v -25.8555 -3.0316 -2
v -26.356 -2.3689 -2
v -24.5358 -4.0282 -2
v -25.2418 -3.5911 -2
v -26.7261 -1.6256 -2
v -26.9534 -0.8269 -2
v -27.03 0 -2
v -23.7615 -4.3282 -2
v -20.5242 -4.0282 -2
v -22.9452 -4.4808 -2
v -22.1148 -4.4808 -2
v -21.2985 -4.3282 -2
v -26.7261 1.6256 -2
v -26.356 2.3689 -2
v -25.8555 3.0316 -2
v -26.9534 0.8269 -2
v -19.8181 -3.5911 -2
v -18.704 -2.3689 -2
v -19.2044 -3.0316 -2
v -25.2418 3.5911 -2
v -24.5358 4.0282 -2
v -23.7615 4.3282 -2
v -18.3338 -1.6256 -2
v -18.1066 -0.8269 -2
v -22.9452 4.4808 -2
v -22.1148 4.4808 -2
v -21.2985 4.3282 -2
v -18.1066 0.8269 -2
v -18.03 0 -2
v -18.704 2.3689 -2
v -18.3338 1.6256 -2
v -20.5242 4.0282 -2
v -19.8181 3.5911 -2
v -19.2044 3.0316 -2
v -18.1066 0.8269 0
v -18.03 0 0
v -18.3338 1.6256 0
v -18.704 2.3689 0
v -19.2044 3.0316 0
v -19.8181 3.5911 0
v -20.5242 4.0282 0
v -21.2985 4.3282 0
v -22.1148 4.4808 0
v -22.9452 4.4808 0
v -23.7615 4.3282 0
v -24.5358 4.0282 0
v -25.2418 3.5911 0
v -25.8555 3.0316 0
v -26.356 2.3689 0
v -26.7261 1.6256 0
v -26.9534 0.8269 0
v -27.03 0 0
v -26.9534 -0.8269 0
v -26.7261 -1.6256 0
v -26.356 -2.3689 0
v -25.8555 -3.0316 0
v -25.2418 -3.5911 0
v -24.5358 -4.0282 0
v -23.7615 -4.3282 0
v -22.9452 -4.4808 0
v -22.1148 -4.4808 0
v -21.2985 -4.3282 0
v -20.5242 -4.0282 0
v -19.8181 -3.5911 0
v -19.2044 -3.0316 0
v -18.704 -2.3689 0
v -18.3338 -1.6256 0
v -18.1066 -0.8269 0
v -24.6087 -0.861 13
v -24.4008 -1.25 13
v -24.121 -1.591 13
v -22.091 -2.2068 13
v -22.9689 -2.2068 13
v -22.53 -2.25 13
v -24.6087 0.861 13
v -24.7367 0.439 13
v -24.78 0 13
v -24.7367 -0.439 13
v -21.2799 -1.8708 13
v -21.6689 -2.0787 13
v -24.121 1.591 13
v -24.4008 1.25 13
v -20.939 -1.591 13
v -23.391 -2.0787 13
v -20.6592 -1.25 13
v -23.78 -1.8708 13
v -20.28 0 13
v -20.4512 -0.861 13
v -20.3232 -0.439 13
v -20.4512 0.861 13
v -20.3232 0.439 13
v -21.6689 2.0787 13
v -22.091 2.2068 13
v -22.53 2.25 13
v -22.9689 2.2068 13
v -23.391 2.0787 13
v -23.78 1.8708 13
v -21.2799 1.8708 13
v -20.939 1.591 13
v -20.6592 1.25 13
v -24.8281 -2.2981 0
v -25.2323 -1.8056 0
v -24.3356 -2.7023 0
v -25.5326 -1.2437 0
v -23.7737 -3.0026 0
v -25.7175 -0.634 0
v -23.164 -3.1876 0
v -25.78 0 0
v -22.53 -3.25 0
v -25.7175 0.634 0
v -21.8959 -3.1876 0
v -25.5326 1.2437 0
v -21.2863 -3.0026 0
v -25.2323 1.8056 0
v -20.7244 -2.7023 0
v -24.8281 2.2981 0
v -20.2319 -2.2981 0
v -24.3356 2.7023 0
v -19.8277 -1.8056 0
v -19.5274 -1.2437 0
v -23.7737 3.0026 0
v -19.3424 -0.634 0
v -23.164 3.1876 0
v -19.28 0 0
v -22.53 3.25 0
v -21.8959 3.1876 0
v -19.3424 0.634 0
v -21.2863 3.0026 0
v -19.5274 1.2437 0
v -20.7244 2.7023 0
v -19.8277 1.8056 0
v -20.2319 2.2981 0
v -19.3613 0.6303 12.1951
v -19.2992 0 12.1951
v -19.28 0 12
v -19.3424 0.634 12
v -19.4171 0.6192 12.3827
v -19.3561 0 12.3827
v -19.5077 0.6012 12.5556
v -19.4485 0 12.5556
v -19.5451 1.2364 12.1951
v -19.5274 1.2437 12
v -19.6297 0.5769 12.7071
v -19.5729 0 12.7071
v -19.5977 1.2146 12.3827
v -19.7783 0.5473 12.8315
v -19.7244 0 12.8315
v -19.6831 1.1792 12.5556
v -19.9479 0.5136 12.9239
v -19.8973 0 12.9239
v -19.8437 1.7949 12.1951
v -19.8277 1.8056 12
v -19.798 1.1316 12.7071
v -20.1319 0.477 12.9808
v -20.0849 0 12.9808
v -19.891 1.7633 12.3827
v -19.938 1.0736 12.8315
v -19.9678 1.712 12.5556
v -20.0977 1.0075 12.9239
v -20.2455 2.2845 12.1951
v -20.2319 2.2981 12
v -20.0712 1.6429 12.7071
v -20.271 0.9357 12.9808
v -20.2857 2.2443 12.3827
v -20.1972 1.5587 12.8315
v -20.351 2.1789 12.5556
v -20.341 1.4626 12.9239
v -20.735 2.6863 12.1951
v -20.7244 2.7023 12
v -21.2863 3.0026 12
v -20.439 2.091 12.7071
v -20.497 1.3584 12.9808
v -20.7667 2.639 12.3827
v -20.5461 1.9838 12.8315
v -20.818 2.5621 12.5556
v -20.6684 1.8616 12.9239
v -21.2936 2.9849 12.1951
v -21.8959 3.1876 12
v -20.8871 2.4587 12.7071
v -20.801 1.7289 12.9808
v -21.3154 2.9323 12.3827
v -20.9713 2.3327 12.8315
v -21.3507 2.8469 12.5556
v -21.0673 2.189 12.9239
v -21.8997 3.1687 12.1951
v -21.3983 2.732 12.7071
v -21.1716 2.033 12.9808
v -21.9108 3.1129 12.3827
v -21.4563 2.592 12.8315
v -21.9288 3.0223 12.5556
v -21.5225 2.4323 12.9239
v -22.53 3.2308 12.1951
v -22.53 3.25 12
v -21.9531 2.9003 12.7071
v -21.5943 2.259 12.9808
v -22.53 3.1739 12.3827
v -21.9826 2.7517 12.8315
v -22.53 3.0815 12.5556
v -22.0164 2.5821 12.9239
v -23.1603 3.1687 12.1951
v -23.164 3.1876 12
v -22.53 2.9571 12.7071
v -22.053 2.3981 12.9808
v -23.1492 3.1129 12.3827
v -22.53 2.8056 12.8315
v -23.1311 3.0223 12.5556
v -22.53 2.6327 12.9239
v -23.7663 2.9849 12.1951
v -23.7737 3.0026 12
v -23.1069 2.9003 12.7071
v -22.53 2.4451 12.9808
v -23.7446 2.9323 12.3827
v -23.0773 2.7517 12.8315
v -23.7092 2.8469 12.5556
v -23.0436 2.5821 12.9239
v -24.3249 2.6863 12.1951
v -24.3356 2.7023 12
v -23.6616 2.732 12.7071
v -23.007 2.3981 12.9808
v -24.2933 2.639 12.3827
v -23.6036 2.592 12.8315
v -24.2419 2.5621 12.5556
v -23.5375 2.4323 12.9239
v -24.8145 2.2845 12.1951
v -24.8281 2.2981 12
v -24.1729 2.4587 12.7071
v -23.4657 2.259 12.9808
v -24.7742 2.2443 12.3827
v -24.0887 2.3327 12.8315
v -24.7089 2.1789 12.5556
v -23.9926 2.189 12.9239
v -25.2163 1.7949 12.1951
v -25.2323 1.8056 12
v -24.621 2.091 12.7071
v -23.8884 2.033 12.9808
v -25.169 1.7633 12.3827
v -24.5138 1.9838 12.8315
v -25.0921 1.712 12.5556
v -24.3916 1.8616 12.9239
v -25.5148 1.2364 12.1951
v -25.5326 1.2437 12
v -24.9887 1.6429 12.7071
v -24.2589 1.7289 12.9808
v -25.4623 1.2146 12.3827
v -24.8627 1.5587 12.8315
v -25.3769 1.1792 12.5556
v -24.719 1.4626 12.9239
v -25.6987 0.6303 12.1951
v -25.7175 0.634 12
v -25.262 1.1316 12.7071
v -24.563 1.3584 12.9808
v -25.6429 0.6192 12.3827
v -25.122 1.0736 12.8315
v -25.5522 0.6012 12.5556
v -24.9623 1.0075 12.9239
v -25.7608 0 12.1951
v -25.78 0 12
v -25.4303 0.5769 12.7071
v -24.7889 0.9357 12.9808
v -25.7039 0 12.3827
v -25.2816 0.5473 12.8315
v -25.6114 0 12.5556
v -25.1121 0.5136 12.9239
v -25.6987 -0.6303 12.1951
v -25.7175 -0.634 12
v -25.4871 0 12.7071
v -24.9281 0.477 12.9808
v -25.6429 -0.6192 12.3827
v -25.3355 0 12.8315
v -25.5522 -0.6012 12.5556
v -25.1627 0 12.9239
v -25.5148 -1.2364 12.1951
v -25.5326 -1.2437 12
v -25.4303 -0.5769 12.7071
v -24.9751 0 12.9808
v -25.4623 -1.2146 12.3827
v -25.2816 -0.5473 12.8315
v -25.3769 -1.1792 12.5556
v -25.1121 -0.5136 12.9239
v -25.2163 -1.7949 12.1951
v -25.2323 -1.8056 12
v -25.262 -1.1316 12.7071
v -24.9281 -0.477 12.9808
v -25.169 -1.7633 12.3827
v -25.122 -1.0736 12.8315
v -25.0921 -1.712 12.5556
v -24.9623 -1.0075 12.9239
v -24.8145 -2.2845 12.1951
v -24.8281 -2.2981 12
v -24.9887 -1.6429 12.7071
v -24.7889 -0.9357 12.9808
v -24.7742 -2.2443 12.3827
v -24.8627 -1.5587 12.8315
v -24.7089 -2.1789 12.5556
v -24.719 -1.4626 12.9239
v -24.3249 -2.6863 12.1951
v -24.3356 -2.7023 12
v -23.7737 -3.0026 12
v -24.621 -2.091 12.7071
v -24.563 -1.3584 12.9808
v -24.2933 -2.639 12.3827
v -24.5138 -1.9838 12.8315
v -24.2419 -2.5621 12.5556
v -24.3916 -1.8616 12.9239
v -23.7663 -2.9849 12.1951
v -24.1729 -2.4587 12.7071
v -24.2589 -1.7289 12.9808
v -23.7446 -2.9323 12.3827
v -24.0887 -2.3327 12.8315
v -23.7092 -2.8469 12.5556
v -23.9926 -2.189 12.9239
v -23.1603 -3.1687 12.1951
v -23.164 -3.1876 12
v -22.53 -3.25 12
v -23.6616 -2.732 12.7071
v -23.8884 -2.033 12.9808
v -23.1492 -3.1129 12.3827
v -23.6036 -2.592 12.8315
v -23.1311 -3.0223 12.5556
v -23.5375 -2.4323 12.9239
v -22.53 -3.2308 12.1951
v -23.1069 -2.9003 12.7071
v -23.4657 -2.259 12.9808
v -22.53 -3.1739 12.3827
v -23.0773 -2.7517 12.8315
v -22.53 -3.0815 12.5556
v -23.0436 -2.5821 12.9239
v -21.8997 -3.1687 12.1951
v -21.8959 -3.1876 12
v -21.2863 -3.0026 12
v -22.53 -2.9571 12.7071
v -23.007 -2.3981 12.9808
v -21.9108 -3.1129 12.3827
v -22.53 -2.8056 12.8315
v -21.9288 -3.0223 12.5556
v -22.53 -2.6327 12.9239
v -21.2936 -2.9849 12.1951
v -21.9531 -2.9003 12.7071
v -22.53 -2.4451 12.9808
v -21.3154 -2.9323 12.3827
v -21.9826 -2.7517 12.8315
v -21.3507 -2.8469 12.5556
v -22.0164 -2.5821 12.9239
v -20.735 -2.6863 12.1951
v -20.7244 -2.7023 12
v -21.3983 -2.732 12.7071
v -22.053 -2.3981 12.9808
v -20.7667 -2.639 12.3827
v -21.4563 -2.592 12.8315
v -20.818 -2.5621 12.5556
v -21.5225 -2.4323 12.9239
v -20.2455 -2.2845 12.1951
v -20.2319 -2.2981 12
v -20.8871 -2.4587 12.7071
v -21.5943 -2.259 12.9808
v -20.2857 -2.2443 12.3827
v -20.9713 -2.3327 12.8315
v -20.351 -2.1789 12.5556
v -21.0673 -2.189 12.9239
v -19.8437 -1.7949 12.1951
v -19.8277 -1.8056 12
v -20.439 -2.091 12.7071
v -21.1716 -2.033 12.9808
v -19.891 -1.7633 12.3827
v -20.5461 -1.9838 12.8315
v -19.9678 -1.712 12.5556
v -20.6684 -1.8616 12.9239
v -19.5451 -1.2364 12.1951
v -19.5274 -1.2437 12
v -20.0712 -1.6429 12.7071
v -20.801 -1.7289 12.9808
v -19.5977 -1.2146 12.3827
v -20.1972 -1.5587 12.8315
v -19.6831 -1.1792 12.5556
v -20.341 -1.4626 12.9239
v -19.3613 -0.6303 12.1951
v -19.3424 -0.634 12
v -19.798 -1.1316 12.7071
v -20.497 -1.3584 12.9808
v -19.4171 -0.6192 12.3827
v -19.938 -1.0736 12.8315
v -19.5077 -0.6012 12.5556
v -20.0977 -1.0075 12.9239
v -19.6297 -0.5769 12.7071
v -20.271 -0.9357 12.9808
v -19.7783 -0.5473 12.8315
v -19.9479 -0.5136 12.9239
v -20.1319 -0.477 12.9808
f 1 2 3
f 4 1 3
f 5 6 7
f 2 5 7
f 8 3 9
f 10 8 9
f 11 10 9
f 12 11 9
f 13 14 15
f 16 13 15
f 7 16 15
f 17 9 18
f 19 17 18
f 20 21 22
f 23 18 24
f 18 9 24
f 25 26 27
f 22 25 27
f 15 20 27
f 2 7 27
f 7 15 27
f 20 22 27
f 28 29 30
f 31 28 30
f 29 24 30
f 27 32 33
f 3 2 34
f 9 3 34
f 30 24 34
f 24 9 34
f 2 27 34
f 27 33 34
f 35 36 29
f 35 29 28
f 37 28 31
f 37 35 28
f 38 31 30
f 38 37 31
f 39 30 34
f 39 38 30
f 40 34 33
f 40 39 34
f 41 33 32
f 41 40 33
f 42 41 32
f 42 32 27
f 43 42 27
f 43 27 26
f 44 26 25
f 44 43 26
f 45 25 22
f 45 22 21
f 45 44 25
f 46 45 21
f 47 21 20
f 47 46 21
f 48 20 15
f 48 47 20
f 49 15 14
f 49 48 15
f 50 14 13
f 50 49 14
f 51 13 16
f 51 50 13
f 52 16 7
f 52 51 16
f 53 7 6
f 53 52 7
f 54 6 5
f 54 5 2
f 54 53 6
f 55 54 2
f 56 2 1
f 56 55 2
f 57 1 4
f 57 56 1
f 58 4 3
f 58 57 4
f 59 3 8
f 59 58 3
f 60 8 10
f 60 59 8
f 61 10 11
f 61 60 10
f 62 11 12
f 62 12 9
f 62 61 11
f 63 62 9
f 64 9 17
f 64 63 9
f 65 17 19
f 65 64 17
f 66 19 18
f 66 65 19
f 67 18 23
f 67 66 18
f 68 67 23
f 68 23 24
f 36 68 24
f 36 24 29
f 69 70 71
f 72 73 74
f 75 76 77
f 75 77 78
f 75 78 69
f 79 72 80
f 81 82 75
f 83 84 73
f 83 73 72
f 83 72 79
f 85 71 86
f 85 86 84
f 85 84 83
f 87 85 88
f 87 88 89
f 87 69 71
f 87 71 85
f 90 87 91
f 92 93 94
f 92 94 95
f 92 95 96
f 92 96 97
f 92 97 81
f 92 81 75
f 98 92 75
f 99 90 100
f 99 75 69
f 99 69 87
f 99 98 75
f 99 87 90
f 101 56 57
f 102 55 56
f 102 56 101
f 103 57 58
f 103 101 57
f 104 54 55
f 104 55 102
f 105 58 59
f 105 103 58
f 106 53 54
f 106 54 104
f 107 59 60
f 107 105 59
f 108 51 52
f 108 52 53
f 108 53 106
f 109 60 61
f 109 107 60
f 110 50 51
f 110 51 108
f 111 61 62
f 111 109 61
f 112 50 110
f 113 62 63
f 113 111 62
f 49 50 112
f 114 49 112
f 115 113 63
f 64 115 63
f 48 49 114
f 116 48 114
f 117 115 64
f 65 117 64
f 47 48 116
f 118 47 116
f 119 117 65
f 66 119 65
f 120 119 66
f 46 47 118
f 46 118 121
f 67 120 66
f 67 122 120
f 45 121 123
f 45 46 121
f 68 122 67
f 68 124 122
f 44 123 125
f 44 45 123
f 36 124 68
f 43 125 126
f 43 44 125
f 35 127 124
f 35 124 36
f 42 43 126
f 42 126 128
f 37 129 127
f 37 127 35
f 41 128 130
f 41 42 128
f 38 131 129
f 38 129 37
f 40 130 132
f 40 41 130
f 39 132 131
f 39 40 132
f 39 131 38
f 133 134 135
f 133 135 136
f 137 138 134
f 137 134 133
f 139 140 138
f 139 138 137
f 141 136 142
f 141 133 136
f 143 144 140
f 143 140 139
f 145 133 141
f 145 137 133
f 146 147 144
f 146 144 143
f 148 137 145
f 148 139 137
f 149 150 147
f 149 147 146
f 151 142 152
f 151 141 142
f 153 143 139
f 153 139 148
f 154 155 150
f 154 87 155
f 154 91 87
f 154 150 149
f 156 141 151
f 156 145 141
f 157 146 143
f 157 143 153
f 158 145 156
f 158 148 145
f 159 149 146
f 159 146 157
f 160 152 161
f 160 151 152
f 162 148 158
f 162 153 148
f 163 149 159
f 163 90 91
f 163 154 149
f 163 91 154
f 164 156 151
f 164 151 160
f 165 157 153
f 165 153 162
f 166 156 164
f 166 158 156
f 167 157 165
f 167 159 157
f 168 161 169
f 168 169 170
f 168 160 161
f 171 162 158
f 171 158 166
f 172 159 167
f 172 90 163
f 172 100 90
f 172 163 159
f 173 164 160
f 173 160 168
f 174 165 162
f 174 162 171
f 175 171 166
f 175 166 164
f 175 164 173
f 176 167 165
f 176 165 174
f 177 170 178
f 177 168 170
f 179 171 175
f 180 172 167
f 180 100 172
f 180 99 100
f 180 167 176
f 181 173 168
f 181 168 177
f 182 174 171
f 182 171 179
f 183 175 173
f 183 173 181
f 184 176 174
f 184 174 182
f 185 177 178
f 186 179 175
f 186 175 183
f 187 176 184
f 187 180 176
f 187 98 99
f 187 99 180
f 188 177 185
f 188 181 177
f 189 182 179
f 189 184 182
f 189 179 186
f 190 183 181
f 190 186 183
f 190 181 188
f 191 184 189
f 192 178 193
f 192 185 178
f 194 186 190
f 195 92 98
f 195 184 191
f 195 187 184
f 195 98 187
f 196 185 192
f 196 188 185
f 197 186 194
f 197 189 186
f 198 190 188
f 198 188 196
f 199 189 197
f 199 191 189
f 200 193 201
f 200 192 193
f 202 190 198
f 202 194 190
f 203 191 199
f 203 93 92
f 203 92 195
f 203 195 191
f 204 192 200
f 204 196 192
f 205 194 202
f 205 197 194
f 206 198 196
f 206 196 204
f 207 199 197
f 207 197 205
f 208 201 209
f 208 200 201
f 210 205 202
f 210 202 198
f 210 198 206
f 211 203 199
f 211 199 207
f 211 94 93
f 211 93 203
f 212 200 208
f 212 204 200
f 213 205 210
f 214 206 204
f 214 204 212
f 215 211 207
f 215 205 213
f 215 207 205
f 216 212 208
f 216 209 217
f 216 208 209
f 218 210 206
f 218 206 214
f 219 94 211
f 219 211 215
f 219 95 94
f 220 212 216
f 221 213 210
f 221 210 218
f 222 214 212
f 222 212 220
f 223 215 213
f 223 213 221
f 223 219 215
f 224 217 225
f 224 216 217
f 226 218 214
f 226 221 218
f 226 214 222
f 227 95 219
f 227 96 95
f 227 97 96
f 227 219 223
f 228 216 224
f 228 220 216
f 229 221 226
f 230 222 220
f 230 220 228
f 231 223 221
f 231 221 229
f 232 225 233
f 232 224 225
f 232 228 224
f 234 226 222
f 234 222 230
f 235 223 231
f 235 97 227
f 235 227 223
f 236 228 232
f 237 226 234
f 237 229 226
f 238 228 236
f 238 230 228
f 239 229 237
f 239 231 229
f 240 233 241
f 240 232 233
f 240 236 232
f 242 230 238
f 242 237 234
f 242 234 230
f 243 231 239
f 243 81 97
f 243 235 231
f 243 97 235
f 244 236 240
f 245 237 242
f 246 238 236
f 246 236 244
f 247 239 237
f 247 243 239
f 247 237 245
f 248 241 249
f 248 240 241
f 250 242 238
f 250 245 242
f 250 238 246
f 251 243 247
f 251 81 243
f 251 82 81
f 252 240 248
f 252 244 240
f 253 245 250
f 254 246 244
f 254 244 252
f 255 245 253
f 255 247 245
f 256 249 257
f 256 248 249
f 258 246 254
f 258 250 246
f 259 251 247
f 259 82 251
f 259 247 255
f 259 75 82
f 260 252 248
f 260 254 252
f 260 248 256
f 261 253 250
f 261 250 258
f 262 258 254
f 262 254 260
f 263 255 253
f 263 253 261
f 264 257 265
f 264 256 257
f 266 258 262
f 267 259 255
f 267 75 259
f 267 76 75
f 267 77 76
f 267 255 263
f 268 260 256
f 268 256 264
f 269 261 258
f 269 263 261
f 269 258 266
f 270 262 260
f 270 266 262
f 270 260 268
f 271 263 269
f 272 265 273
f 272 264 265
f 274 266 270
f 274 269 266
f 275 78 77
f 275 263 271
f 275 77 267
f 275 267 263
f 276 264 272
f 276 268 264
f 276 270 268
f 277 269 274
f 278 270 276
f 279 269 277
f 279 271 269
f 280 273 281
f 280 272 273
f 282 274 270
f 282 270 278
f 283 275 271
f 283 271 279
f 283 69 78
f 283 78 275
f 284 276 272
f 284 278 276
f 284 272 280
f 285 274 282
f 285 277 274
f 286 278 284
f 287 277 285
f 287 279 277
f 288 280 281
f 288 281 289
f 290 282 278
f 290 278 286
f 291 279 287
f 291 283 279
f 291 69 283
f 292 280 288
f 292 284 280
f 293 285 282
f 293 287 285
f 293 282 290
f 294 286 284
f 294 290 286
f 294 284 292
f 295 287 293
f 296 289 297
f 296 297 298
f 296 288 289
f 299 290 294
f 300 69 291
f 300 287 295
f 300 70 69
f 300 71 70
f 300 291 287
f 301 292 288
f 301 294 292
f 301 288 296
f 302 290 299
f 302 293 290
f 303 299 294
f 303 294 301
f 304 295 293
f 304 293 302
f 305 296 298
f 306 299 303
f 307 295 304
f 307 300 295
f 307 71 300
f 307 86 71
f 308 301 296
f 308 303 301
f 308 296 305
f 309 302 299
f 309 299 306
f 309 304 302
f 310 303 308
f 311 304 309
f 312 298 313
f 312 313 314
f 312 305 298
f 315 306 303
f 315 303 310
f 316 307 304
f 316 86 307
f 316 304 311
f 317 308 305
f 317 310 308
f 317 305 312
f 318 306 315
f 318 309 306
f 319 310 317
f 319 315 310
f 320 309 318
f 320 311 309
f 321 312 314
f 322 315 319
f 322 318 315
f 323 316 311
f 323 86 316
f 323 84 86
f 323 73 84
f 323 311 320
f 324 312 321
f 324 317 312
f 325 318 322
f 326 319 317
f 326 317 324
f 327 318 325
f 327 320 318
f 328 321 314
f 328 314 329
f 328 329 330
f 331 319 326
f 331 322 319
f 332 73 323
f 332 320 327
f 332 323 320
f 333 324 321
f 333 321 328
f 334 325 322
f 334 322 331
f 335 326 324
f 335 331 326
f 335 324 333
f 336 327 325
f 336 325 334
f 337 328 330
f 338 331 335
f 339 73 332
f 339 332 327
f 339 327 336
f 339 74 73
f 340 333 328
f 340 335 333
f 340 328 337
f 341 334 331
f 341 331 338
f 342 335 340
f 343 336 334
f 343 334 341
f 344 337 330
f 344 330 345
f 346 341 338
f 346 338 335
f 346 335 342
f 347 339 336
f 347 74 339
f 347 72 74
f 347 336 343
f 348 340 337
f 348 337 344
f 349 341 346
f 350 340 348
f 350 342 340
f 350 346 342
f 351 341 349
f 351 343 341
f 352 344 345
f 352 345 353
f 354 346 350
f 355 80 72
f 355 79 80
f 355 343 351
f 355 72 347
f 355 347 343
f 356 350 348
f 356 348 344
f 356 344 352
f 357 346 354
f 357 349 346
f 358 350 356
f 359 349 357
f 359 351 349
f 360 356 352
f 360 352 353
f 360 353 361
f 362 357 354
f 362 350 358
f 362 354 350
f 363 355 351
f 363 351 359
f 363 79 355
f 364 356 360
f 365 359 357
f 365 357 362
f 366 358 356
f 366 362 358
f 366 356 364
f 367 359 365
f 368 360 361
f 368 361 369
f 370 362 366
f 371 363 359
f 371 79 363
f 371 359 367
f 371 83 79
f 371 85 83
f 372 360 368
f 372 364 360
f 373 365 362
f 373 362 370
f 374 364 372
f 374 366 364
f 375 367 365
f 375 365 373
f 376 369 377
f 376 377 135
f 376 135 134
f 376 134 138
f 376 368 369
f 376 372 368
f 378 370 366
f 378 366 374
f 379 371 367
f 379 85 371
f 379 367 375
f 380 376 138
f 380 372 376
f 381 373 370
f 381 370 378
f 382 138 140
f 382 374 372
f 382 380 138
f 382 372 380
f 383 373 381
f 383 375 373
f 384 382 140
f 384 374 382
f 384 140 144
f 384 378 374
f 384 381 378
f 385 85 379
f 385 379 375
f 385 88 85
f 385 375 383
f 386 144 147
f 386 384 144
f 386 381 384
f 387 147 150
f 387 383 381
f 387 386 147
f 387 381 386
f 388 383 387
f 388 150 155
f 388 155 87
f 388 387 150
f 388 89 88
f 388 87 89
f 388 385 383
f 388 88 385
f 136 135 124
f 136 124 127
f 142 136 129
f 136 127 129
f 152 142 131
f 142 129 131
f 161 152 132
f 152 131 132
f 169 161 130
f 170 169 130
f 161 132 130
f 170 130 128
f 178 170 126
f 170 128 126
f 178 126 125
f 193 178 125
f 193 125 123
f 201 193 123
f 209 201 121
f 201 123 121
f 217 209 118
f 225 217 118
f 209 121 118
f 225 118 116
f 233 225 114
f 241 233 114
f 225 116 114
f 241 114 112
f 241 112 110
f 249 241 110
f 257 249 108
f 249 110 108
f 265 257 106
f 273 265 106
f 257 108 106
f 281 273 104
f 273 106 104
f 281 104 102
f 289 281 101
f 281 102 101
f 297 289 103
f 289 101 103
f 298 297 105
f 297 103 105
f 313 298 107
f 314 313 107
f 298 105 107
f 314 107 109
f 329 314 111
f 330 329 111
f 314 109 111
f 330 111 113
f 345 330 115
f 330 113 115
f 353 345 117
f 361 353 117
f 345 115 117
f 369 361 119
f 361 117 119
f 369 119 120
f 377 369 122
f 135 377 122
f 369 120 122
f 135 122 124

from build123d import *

# Parameters (mm, degrees)
F0_R     = 3.25
F1_DEPTH = 13
F0_R_2   = 4.5
F2_DEPTH = 2
F3_R     = 1


with BuildPart() as f1:
    # F0 (on Top) → F1 (new body)
    with BuildSketch(Plane.XY):
        with Locations((-22.529975, 0)):
            Circle(F0_R)
    extrude(amount=F1_DEPTH)

    # F0 (on Top) → F2 (join)
    with BuildSketch(Plane.XY):
        with Locations((-22.529975, 0)):
            Circle(F0_R_2)
        with Locations((-22.529975, 0)):
            Circle(F0_R, mode=Mode.SUBTRACT)
        with Locations((-22.529975, 0)):
            Circle(F0_R)
    extrude(amount=-F2_DEPTH)

    # F3
    f3_edges = [f1.edges().sort_by_distance(p)[0] for p in [
        (-25.779975, 0, 13),
    ]]
    fillet(f3_edges, radius=F3_R)


solid = f1.part
